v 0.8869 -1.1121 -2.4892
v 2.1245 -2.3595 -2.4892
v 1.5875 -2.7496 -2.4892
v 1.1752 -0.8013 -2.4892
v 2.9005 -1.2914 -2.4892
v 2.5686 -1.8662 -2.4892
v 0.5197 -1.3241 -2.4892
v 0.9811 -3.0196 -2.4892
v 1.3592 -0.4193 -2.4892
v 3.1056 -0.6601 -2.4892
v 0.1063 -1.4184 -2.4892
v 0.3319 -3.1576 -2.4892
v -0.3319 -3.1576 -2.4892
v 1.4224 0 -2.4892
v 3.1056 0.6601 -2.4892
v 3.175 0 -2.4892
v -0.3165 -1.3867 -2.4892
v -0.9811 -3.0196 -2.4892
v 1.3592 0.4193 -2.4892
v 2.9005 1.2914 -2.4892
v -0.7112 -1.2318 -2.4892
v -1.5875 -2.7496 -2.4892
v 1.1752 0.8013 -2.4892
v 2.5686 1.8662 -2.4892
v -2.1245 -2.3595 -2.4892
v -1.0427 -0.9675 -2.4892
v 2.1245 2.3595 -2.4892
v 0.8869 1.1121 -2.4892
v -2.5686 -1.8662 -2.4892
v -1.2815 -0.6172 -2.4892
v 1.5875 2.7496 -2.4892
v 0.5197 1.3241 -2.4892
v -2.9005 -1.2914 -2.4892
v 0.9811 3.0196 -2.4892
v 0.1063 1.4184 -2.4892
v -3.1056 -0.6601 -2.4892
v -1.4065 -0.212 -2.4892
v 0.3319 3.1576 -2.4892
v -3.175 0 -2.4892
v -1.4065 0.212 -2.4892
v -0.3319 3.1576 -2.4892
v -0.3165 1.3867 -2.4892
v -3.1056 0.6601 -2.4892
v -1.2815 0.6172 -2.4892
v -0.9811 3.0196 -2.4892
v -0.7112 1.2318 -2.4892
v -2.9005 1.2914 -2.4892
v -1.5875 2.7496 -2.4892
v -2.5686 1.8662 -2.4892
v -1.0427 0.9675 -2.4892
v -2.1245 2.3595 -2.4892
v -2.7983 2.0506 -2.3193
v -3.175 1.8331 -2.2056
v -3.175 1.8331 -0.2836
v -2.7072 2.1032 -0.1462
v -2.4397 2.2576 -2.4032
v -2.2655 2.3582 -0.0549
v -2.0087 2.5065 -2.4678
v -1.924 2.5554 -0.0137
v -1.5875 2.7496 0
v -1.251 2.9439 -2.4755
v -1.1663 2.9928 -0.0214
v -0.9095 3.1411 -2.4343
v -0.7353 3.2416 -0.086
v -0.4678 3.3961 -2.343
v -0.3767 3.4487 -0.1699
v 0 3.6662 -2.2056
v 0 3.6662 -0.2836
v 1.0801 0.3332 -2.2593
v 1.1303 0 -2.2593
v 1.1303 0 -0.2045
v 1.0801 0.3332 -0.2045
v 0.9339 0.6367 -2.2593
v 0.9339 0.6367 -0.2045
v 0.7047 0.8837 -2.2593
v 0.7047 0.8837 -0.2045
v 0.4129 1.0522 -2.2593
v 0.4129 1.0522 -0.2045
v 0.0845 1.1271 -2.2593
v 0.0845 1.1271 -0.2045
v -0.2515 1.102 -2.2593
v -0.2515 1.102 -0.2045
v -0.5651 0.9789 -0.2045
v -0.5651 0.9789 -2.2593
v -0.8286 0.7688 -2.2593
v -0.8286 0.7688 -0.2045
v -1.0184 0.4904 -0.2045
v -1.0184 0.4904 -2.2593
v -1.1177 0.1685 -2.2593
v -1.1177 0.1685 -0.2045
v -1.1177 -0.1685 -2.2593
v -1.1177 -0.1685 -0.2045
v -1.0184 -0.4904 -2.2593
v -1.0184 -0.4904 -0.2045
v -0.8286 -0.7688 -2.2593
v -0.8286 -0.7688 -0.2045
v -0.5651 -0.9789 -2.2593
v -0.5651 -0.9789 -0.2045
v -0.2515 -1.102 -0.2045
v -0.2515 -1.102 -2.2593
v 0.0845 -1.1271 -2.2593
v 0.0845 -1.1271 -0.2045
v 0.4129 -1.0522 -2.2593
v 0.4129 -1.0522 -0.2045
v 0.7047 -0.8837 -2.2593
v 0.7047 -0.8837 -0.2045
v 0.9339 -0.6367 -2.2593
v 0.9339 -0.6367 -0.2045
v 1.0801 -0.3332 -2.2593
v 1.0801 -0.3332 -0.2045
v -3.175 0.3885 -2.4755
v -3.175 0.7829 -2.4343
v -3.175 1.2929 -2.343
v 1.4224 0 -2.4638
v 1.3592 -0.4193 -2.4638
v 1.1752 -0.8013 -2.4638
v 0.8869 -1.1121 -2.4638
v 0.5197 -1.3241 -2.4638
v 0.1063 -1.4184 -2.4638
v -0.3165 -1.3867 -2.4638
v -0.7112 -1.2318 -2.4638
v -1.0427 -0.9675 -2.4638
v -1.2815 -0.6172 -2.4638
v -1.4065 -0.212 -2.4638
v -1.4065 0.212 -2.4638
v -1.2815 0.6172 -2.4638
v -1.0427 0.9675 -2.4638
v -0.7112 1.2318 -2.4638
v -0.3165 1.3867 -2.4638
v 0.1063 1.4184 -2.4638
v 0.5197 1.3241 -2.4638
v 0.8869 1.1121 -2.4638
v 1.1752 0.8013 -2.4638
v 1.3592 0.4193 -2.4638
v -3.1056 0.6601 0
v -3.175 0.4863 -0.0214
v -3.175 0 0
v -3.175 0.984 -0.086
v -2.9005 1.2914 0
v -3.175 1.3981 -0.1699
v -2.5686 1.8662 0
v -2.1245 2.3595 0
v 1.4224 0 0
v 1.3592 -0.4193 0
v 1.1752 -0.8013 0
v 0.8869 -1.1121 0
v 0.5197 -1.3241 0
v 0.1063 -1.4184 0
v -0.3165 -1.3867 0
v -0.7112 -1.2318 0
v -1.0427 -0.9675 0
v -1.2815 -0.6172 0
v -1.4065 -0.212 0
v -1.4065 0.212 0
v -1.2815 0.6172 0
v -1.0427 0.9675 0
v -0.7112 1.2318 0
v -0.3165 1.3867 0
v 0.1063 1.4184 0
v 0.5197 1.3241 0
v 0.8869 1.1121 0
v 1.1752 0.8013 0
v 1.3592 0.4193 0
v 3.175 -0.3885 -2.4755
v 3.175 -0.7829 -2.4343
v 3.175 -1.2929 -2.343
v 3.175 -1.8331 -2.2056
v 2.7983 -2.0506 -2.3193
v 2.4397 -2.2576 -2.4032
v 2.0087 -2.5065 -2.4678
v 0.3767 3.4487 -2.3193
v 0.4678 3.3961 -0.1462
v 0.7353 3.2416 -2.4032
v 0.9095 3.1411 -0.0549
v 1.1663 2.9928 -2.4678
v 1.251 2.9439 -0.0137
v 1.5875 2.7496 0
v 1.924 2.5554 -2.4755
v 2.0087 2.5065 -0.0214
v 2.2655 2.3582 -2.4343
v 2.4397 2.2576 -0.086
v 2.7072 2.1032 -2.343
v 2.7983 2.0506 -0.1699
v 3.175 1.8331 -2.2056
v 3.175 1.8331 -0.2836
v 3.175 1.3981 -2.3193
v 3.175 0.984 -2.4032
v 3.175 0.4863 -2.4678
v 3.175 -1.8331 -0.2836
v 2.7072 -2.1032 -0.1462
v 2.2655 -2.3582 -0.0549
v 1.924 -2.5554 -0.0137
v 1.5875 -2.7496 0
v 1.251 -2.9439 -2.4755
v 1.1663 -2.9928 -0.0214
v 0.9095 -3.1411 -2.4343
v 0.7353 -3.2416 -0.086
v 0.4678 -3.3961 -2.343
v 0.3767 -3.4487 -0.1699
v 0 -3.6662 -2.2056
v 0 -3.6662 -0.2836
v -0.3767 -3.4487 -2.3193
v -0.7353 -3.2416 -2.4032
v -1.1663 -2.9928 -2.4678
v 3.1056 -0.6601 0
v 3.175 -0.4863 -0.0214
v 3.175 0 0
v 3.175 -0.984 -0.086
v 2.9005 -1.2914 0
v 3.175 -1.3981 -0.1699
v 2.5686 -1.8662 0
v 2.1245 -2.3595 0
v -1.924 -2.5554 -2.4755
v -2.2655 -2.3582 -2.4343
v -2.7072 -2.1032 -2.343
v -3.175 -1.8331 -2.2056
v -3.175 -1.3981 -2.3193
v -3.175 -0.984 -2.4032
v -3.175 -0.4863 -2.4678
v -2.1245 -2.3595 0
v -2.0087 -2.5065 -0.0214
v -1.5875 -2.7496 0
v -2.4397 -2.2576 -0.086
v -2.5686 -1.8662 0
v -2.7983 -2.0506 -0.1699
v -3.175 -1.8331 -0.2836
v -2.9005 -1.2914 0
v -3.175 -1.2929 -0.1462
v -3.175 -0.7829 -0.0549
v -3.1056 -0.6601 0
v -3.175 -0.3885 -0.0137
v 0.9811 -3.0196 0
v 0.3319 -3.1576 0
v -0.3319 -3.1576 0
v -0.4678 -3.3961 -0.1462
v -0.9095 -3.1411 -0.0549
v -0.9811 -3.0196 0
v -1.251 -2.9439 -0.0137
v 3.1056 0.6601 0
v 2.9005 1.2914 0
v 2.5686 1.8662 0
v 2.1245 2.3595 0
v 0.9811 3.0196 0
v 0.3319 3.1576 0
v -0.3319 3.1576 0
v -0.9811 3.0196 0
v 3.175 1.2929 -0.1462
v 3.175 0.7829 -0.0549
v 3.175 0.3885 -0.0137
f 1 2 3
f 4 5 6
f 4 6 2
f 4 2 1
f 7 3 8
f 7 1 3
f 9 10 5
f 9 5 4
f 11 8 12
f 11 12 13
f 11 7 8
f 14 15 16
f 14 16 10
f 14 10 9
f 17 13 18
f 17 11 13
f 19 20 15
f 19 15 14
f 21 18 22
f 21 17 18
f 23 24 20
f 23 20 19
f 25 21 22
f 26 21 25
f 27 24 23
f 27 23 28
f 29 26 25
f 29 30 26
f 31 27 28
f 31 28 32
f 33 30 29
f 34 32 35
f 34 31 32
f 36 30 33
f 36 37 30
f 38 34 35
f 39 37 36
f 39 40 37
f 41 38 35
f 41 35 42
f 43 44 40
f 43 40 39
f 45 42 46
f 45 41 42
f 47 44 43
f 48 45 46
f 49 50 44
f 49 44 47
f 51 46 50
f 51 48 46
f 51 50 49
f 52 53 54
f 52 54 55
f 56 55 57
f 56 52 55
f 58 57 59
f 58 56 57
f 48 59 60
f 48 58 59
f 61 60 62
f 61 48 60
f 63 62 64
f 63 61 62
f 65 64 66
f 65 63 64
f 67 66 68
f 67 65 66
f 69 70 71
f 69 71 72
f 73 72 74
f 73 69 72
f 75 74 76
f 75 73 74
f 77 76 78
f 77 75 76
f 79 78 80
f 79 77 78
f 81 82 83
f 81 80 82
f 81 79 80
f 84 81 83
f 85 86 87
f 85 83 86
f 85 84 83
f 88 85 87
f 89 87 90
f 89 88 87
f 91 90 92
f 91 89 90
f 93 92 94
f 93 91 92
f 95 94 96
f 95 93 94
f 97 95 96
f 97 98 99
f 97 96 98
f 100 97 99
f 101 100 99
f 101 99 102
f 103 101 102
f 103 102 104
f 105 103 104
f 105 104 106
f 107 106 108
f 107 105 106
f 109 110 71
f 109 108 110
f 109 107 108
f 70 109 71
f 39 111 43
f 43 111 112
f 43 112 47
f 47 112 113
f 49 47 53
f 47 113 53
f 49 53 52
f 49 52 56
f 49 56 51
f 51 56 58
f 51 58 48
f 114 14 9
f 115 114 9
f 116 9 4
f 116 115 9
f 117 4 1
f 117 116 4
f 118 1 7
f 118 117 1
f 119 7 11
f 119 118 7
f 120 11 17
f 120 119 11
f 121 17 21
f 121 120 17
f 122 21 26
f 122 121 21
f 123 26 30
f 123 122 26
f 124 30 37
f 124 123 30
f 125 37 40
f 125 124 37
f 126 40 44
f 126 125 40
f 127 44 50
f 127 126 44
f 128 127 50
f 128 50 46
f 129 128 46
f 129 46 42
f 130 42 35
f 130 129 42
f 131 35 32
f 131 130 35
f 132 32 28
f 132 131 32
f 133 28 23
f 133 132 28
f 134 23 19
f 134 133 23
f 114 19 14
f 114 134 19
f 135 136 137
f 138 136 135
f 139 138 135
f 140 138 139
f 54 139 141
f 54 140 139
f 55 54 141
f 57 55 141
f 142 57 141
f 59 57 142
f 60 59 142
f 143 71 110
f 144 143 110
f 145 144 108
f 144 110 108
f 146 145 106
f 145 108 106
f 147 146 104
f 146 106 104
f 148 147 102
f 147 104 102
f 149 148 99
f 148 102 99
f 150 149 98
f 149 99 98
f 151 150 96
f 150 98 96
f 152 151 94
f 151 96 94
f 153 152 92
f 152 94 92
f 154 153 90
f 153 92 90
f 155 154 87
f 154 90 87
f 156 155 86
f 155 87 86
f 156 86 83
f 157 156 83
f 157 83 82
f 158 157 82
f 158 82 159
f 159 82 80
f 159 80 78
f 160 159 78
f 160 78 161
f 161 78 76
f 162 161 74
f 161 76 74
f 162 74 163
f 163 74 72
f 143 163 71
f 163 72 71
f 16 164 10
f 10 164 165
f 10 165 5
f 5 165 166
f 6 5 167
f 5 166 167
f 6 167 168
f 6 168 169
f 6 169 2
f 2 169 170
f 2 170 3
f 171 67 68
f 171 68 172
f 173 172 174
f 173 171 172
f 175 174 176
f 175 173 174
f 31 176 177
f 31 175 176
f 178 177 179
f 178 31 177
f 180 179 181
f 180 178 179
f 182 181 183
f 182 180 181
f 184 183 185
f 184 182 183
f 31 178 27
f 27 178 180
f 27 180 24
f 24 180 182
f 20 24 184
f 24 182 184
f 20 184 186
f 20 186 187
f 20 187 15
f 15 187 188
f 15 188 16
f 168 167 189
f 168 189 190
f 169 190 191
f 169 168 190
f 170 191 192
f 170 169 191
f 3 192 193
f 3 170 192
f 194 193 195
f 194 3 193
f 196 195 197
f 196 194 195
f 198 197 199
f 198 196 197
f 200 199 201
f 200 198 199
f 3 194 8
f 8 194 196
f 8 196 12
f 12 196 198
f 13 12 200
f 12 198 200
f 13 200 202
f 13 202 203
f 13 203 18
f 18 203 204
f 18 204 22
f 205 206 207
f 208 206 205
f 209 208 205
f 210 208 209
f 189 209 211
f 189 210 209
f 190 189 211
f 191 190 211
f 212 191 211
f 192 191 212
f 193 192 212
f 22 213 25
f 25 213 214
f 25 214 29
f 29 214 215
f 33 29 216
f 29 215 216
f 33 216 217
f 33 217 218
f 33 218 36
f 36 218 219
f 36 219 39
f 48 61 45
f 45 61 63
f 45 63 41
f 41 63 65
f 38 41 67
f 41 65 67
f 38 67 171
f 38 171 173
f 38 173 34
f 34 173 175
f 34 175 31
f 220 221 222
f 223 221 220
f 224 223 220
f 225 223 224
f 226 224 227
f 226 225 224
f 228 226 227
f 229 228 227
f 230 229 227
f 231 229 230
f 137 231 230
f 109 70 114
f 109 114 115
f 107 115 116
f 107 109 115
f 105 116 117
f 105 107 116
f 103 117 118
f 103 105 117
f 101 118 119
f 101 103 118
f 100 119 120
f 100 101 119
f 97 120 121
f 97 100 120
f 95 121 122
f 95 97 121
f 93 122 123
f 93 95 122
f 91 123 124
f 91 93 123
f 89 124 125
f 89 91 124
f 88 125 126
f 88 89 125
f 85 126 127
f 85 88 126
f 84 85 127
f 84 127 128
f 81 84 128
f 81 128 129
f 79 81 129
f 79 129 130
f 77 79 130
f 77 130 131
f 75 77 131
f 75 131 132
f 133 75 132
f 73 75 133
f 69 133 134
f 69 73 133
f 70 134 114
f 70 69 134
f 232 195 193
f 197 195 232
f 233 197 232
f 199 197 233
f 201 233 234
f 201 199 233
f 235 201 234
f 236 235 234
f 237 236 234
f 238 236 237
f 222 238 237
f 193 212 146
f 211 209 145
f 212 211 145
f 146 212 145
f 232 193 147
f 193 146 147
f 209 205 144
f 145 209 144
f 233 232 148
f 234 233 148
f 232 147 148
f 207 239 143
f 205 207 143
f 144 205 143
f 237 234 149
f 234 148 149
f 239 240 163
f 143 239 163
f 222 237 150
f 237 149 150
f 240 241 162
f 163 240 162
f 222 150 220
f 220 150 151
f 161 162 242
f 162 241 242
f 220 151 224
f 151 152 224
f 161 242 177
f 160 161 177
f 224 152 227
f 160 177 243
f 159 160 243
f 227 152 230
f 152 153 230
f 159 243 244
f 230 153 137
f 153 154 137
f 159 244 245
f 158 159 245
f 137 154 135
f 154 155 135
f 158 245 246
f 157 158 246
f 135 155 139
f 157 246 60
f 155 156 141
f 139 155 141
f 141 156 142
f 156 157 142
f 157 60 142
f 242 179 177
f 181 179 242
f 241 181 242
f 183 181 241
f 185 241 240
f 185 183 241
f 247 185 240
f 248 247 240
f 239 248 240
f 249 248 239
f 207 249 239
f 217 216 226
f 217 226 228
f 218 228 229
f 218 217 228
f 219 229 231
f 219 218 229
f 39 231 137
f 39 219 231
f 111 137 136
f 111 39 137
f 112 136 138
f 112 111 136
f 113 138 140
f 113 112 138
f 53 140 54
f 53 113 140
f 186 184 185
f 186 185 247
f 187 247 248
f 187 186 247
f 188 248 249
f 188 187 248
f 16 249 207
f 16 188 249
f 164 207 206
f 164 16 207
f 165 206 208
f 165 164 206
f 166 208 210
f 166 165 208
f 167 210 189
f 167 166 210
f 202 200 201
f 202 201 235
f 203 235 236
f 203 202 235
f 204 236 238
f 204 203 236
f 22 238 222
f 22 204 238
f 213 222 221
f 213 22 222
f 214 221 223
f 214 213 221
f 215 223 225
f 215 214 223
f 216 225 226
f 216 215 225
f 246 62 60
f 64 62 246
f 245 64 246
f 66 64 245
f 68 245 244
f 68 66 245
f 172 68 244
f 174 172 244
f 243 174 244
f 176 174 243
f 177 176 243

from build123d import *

# Parameters (mm, degrees)
BASENUT_START = -2.4892
BASENUTSKE_R  = 1.1303
BASENUT_DEPTH = 2.4892


with BuildPart() as part:
    # BaseNutSke → BaseNut (new body)
    with BuildSketch(Plane.XY.offset(BASENUT_START)):
        Polygon((3.175, 1.833087105), (3.175, -1.833087105), (0, -3.666174209), (-3.175, -1.833087105), (-3.175, 1.833087105), (0, 3.666174209), align=None)
        Circle(BASENUTSKE_R, mode=Mode.SUBTRACT)
    extrude(amount=BASENUT_DEPTH)

    # Sketch3 → Double-Chamfer (revolve, cut)
    with BuildSketch(Plane(origin=(0, 0, 0), x_dir=(0, 0, -1), z_dir=(1, 0, 0))):
        Polygon((2.4892, 3.175), (2.205620438, 3.666174209), (2.205620438, 16.366174209), (15.1892, 16.366174209), (15.1892, 3.175), align=None)
        Polygon((0.283579562, 16.366174209), (-12.7, 16.366174209), (-12.7, 3.175), (0, 3.175), (0.283579562, 3.666174209), align=None)
    revolve(axis=Axis((0, 0, 0), (0, 0, -1)), mode=Mode.SUBTRACT)

    # EndChamferSketch → EndChamfer (revolve, cut)
    with BuildSketch(Plane(origin=(0, 0, 0), x_dir=(0, 0, -1), z_dir=(1, 0, 0)), mode=Mode.PRIVATE) as endchamfer_sk:
        Polygon((2.4638, 1.4224), (2.238816316, 1.10109), (2.5146, 1.10109), (2.5146, 1.4224), align=None)
        Polygon((-0.0508, 1.4224), (0, 1.4224), (0.224983684, 1.10109), (-0.0508, 1.10109), align=None)
    revolve(endchamfer_sk.sketch.rotate(Axis((0, 0, -25.037505729), (0, 0, -1)), 90), axis=Axis((0, 0, -25.037505729), (0, 0, -1)), mode=Mode.SUBTRACT)


solid = part.part
